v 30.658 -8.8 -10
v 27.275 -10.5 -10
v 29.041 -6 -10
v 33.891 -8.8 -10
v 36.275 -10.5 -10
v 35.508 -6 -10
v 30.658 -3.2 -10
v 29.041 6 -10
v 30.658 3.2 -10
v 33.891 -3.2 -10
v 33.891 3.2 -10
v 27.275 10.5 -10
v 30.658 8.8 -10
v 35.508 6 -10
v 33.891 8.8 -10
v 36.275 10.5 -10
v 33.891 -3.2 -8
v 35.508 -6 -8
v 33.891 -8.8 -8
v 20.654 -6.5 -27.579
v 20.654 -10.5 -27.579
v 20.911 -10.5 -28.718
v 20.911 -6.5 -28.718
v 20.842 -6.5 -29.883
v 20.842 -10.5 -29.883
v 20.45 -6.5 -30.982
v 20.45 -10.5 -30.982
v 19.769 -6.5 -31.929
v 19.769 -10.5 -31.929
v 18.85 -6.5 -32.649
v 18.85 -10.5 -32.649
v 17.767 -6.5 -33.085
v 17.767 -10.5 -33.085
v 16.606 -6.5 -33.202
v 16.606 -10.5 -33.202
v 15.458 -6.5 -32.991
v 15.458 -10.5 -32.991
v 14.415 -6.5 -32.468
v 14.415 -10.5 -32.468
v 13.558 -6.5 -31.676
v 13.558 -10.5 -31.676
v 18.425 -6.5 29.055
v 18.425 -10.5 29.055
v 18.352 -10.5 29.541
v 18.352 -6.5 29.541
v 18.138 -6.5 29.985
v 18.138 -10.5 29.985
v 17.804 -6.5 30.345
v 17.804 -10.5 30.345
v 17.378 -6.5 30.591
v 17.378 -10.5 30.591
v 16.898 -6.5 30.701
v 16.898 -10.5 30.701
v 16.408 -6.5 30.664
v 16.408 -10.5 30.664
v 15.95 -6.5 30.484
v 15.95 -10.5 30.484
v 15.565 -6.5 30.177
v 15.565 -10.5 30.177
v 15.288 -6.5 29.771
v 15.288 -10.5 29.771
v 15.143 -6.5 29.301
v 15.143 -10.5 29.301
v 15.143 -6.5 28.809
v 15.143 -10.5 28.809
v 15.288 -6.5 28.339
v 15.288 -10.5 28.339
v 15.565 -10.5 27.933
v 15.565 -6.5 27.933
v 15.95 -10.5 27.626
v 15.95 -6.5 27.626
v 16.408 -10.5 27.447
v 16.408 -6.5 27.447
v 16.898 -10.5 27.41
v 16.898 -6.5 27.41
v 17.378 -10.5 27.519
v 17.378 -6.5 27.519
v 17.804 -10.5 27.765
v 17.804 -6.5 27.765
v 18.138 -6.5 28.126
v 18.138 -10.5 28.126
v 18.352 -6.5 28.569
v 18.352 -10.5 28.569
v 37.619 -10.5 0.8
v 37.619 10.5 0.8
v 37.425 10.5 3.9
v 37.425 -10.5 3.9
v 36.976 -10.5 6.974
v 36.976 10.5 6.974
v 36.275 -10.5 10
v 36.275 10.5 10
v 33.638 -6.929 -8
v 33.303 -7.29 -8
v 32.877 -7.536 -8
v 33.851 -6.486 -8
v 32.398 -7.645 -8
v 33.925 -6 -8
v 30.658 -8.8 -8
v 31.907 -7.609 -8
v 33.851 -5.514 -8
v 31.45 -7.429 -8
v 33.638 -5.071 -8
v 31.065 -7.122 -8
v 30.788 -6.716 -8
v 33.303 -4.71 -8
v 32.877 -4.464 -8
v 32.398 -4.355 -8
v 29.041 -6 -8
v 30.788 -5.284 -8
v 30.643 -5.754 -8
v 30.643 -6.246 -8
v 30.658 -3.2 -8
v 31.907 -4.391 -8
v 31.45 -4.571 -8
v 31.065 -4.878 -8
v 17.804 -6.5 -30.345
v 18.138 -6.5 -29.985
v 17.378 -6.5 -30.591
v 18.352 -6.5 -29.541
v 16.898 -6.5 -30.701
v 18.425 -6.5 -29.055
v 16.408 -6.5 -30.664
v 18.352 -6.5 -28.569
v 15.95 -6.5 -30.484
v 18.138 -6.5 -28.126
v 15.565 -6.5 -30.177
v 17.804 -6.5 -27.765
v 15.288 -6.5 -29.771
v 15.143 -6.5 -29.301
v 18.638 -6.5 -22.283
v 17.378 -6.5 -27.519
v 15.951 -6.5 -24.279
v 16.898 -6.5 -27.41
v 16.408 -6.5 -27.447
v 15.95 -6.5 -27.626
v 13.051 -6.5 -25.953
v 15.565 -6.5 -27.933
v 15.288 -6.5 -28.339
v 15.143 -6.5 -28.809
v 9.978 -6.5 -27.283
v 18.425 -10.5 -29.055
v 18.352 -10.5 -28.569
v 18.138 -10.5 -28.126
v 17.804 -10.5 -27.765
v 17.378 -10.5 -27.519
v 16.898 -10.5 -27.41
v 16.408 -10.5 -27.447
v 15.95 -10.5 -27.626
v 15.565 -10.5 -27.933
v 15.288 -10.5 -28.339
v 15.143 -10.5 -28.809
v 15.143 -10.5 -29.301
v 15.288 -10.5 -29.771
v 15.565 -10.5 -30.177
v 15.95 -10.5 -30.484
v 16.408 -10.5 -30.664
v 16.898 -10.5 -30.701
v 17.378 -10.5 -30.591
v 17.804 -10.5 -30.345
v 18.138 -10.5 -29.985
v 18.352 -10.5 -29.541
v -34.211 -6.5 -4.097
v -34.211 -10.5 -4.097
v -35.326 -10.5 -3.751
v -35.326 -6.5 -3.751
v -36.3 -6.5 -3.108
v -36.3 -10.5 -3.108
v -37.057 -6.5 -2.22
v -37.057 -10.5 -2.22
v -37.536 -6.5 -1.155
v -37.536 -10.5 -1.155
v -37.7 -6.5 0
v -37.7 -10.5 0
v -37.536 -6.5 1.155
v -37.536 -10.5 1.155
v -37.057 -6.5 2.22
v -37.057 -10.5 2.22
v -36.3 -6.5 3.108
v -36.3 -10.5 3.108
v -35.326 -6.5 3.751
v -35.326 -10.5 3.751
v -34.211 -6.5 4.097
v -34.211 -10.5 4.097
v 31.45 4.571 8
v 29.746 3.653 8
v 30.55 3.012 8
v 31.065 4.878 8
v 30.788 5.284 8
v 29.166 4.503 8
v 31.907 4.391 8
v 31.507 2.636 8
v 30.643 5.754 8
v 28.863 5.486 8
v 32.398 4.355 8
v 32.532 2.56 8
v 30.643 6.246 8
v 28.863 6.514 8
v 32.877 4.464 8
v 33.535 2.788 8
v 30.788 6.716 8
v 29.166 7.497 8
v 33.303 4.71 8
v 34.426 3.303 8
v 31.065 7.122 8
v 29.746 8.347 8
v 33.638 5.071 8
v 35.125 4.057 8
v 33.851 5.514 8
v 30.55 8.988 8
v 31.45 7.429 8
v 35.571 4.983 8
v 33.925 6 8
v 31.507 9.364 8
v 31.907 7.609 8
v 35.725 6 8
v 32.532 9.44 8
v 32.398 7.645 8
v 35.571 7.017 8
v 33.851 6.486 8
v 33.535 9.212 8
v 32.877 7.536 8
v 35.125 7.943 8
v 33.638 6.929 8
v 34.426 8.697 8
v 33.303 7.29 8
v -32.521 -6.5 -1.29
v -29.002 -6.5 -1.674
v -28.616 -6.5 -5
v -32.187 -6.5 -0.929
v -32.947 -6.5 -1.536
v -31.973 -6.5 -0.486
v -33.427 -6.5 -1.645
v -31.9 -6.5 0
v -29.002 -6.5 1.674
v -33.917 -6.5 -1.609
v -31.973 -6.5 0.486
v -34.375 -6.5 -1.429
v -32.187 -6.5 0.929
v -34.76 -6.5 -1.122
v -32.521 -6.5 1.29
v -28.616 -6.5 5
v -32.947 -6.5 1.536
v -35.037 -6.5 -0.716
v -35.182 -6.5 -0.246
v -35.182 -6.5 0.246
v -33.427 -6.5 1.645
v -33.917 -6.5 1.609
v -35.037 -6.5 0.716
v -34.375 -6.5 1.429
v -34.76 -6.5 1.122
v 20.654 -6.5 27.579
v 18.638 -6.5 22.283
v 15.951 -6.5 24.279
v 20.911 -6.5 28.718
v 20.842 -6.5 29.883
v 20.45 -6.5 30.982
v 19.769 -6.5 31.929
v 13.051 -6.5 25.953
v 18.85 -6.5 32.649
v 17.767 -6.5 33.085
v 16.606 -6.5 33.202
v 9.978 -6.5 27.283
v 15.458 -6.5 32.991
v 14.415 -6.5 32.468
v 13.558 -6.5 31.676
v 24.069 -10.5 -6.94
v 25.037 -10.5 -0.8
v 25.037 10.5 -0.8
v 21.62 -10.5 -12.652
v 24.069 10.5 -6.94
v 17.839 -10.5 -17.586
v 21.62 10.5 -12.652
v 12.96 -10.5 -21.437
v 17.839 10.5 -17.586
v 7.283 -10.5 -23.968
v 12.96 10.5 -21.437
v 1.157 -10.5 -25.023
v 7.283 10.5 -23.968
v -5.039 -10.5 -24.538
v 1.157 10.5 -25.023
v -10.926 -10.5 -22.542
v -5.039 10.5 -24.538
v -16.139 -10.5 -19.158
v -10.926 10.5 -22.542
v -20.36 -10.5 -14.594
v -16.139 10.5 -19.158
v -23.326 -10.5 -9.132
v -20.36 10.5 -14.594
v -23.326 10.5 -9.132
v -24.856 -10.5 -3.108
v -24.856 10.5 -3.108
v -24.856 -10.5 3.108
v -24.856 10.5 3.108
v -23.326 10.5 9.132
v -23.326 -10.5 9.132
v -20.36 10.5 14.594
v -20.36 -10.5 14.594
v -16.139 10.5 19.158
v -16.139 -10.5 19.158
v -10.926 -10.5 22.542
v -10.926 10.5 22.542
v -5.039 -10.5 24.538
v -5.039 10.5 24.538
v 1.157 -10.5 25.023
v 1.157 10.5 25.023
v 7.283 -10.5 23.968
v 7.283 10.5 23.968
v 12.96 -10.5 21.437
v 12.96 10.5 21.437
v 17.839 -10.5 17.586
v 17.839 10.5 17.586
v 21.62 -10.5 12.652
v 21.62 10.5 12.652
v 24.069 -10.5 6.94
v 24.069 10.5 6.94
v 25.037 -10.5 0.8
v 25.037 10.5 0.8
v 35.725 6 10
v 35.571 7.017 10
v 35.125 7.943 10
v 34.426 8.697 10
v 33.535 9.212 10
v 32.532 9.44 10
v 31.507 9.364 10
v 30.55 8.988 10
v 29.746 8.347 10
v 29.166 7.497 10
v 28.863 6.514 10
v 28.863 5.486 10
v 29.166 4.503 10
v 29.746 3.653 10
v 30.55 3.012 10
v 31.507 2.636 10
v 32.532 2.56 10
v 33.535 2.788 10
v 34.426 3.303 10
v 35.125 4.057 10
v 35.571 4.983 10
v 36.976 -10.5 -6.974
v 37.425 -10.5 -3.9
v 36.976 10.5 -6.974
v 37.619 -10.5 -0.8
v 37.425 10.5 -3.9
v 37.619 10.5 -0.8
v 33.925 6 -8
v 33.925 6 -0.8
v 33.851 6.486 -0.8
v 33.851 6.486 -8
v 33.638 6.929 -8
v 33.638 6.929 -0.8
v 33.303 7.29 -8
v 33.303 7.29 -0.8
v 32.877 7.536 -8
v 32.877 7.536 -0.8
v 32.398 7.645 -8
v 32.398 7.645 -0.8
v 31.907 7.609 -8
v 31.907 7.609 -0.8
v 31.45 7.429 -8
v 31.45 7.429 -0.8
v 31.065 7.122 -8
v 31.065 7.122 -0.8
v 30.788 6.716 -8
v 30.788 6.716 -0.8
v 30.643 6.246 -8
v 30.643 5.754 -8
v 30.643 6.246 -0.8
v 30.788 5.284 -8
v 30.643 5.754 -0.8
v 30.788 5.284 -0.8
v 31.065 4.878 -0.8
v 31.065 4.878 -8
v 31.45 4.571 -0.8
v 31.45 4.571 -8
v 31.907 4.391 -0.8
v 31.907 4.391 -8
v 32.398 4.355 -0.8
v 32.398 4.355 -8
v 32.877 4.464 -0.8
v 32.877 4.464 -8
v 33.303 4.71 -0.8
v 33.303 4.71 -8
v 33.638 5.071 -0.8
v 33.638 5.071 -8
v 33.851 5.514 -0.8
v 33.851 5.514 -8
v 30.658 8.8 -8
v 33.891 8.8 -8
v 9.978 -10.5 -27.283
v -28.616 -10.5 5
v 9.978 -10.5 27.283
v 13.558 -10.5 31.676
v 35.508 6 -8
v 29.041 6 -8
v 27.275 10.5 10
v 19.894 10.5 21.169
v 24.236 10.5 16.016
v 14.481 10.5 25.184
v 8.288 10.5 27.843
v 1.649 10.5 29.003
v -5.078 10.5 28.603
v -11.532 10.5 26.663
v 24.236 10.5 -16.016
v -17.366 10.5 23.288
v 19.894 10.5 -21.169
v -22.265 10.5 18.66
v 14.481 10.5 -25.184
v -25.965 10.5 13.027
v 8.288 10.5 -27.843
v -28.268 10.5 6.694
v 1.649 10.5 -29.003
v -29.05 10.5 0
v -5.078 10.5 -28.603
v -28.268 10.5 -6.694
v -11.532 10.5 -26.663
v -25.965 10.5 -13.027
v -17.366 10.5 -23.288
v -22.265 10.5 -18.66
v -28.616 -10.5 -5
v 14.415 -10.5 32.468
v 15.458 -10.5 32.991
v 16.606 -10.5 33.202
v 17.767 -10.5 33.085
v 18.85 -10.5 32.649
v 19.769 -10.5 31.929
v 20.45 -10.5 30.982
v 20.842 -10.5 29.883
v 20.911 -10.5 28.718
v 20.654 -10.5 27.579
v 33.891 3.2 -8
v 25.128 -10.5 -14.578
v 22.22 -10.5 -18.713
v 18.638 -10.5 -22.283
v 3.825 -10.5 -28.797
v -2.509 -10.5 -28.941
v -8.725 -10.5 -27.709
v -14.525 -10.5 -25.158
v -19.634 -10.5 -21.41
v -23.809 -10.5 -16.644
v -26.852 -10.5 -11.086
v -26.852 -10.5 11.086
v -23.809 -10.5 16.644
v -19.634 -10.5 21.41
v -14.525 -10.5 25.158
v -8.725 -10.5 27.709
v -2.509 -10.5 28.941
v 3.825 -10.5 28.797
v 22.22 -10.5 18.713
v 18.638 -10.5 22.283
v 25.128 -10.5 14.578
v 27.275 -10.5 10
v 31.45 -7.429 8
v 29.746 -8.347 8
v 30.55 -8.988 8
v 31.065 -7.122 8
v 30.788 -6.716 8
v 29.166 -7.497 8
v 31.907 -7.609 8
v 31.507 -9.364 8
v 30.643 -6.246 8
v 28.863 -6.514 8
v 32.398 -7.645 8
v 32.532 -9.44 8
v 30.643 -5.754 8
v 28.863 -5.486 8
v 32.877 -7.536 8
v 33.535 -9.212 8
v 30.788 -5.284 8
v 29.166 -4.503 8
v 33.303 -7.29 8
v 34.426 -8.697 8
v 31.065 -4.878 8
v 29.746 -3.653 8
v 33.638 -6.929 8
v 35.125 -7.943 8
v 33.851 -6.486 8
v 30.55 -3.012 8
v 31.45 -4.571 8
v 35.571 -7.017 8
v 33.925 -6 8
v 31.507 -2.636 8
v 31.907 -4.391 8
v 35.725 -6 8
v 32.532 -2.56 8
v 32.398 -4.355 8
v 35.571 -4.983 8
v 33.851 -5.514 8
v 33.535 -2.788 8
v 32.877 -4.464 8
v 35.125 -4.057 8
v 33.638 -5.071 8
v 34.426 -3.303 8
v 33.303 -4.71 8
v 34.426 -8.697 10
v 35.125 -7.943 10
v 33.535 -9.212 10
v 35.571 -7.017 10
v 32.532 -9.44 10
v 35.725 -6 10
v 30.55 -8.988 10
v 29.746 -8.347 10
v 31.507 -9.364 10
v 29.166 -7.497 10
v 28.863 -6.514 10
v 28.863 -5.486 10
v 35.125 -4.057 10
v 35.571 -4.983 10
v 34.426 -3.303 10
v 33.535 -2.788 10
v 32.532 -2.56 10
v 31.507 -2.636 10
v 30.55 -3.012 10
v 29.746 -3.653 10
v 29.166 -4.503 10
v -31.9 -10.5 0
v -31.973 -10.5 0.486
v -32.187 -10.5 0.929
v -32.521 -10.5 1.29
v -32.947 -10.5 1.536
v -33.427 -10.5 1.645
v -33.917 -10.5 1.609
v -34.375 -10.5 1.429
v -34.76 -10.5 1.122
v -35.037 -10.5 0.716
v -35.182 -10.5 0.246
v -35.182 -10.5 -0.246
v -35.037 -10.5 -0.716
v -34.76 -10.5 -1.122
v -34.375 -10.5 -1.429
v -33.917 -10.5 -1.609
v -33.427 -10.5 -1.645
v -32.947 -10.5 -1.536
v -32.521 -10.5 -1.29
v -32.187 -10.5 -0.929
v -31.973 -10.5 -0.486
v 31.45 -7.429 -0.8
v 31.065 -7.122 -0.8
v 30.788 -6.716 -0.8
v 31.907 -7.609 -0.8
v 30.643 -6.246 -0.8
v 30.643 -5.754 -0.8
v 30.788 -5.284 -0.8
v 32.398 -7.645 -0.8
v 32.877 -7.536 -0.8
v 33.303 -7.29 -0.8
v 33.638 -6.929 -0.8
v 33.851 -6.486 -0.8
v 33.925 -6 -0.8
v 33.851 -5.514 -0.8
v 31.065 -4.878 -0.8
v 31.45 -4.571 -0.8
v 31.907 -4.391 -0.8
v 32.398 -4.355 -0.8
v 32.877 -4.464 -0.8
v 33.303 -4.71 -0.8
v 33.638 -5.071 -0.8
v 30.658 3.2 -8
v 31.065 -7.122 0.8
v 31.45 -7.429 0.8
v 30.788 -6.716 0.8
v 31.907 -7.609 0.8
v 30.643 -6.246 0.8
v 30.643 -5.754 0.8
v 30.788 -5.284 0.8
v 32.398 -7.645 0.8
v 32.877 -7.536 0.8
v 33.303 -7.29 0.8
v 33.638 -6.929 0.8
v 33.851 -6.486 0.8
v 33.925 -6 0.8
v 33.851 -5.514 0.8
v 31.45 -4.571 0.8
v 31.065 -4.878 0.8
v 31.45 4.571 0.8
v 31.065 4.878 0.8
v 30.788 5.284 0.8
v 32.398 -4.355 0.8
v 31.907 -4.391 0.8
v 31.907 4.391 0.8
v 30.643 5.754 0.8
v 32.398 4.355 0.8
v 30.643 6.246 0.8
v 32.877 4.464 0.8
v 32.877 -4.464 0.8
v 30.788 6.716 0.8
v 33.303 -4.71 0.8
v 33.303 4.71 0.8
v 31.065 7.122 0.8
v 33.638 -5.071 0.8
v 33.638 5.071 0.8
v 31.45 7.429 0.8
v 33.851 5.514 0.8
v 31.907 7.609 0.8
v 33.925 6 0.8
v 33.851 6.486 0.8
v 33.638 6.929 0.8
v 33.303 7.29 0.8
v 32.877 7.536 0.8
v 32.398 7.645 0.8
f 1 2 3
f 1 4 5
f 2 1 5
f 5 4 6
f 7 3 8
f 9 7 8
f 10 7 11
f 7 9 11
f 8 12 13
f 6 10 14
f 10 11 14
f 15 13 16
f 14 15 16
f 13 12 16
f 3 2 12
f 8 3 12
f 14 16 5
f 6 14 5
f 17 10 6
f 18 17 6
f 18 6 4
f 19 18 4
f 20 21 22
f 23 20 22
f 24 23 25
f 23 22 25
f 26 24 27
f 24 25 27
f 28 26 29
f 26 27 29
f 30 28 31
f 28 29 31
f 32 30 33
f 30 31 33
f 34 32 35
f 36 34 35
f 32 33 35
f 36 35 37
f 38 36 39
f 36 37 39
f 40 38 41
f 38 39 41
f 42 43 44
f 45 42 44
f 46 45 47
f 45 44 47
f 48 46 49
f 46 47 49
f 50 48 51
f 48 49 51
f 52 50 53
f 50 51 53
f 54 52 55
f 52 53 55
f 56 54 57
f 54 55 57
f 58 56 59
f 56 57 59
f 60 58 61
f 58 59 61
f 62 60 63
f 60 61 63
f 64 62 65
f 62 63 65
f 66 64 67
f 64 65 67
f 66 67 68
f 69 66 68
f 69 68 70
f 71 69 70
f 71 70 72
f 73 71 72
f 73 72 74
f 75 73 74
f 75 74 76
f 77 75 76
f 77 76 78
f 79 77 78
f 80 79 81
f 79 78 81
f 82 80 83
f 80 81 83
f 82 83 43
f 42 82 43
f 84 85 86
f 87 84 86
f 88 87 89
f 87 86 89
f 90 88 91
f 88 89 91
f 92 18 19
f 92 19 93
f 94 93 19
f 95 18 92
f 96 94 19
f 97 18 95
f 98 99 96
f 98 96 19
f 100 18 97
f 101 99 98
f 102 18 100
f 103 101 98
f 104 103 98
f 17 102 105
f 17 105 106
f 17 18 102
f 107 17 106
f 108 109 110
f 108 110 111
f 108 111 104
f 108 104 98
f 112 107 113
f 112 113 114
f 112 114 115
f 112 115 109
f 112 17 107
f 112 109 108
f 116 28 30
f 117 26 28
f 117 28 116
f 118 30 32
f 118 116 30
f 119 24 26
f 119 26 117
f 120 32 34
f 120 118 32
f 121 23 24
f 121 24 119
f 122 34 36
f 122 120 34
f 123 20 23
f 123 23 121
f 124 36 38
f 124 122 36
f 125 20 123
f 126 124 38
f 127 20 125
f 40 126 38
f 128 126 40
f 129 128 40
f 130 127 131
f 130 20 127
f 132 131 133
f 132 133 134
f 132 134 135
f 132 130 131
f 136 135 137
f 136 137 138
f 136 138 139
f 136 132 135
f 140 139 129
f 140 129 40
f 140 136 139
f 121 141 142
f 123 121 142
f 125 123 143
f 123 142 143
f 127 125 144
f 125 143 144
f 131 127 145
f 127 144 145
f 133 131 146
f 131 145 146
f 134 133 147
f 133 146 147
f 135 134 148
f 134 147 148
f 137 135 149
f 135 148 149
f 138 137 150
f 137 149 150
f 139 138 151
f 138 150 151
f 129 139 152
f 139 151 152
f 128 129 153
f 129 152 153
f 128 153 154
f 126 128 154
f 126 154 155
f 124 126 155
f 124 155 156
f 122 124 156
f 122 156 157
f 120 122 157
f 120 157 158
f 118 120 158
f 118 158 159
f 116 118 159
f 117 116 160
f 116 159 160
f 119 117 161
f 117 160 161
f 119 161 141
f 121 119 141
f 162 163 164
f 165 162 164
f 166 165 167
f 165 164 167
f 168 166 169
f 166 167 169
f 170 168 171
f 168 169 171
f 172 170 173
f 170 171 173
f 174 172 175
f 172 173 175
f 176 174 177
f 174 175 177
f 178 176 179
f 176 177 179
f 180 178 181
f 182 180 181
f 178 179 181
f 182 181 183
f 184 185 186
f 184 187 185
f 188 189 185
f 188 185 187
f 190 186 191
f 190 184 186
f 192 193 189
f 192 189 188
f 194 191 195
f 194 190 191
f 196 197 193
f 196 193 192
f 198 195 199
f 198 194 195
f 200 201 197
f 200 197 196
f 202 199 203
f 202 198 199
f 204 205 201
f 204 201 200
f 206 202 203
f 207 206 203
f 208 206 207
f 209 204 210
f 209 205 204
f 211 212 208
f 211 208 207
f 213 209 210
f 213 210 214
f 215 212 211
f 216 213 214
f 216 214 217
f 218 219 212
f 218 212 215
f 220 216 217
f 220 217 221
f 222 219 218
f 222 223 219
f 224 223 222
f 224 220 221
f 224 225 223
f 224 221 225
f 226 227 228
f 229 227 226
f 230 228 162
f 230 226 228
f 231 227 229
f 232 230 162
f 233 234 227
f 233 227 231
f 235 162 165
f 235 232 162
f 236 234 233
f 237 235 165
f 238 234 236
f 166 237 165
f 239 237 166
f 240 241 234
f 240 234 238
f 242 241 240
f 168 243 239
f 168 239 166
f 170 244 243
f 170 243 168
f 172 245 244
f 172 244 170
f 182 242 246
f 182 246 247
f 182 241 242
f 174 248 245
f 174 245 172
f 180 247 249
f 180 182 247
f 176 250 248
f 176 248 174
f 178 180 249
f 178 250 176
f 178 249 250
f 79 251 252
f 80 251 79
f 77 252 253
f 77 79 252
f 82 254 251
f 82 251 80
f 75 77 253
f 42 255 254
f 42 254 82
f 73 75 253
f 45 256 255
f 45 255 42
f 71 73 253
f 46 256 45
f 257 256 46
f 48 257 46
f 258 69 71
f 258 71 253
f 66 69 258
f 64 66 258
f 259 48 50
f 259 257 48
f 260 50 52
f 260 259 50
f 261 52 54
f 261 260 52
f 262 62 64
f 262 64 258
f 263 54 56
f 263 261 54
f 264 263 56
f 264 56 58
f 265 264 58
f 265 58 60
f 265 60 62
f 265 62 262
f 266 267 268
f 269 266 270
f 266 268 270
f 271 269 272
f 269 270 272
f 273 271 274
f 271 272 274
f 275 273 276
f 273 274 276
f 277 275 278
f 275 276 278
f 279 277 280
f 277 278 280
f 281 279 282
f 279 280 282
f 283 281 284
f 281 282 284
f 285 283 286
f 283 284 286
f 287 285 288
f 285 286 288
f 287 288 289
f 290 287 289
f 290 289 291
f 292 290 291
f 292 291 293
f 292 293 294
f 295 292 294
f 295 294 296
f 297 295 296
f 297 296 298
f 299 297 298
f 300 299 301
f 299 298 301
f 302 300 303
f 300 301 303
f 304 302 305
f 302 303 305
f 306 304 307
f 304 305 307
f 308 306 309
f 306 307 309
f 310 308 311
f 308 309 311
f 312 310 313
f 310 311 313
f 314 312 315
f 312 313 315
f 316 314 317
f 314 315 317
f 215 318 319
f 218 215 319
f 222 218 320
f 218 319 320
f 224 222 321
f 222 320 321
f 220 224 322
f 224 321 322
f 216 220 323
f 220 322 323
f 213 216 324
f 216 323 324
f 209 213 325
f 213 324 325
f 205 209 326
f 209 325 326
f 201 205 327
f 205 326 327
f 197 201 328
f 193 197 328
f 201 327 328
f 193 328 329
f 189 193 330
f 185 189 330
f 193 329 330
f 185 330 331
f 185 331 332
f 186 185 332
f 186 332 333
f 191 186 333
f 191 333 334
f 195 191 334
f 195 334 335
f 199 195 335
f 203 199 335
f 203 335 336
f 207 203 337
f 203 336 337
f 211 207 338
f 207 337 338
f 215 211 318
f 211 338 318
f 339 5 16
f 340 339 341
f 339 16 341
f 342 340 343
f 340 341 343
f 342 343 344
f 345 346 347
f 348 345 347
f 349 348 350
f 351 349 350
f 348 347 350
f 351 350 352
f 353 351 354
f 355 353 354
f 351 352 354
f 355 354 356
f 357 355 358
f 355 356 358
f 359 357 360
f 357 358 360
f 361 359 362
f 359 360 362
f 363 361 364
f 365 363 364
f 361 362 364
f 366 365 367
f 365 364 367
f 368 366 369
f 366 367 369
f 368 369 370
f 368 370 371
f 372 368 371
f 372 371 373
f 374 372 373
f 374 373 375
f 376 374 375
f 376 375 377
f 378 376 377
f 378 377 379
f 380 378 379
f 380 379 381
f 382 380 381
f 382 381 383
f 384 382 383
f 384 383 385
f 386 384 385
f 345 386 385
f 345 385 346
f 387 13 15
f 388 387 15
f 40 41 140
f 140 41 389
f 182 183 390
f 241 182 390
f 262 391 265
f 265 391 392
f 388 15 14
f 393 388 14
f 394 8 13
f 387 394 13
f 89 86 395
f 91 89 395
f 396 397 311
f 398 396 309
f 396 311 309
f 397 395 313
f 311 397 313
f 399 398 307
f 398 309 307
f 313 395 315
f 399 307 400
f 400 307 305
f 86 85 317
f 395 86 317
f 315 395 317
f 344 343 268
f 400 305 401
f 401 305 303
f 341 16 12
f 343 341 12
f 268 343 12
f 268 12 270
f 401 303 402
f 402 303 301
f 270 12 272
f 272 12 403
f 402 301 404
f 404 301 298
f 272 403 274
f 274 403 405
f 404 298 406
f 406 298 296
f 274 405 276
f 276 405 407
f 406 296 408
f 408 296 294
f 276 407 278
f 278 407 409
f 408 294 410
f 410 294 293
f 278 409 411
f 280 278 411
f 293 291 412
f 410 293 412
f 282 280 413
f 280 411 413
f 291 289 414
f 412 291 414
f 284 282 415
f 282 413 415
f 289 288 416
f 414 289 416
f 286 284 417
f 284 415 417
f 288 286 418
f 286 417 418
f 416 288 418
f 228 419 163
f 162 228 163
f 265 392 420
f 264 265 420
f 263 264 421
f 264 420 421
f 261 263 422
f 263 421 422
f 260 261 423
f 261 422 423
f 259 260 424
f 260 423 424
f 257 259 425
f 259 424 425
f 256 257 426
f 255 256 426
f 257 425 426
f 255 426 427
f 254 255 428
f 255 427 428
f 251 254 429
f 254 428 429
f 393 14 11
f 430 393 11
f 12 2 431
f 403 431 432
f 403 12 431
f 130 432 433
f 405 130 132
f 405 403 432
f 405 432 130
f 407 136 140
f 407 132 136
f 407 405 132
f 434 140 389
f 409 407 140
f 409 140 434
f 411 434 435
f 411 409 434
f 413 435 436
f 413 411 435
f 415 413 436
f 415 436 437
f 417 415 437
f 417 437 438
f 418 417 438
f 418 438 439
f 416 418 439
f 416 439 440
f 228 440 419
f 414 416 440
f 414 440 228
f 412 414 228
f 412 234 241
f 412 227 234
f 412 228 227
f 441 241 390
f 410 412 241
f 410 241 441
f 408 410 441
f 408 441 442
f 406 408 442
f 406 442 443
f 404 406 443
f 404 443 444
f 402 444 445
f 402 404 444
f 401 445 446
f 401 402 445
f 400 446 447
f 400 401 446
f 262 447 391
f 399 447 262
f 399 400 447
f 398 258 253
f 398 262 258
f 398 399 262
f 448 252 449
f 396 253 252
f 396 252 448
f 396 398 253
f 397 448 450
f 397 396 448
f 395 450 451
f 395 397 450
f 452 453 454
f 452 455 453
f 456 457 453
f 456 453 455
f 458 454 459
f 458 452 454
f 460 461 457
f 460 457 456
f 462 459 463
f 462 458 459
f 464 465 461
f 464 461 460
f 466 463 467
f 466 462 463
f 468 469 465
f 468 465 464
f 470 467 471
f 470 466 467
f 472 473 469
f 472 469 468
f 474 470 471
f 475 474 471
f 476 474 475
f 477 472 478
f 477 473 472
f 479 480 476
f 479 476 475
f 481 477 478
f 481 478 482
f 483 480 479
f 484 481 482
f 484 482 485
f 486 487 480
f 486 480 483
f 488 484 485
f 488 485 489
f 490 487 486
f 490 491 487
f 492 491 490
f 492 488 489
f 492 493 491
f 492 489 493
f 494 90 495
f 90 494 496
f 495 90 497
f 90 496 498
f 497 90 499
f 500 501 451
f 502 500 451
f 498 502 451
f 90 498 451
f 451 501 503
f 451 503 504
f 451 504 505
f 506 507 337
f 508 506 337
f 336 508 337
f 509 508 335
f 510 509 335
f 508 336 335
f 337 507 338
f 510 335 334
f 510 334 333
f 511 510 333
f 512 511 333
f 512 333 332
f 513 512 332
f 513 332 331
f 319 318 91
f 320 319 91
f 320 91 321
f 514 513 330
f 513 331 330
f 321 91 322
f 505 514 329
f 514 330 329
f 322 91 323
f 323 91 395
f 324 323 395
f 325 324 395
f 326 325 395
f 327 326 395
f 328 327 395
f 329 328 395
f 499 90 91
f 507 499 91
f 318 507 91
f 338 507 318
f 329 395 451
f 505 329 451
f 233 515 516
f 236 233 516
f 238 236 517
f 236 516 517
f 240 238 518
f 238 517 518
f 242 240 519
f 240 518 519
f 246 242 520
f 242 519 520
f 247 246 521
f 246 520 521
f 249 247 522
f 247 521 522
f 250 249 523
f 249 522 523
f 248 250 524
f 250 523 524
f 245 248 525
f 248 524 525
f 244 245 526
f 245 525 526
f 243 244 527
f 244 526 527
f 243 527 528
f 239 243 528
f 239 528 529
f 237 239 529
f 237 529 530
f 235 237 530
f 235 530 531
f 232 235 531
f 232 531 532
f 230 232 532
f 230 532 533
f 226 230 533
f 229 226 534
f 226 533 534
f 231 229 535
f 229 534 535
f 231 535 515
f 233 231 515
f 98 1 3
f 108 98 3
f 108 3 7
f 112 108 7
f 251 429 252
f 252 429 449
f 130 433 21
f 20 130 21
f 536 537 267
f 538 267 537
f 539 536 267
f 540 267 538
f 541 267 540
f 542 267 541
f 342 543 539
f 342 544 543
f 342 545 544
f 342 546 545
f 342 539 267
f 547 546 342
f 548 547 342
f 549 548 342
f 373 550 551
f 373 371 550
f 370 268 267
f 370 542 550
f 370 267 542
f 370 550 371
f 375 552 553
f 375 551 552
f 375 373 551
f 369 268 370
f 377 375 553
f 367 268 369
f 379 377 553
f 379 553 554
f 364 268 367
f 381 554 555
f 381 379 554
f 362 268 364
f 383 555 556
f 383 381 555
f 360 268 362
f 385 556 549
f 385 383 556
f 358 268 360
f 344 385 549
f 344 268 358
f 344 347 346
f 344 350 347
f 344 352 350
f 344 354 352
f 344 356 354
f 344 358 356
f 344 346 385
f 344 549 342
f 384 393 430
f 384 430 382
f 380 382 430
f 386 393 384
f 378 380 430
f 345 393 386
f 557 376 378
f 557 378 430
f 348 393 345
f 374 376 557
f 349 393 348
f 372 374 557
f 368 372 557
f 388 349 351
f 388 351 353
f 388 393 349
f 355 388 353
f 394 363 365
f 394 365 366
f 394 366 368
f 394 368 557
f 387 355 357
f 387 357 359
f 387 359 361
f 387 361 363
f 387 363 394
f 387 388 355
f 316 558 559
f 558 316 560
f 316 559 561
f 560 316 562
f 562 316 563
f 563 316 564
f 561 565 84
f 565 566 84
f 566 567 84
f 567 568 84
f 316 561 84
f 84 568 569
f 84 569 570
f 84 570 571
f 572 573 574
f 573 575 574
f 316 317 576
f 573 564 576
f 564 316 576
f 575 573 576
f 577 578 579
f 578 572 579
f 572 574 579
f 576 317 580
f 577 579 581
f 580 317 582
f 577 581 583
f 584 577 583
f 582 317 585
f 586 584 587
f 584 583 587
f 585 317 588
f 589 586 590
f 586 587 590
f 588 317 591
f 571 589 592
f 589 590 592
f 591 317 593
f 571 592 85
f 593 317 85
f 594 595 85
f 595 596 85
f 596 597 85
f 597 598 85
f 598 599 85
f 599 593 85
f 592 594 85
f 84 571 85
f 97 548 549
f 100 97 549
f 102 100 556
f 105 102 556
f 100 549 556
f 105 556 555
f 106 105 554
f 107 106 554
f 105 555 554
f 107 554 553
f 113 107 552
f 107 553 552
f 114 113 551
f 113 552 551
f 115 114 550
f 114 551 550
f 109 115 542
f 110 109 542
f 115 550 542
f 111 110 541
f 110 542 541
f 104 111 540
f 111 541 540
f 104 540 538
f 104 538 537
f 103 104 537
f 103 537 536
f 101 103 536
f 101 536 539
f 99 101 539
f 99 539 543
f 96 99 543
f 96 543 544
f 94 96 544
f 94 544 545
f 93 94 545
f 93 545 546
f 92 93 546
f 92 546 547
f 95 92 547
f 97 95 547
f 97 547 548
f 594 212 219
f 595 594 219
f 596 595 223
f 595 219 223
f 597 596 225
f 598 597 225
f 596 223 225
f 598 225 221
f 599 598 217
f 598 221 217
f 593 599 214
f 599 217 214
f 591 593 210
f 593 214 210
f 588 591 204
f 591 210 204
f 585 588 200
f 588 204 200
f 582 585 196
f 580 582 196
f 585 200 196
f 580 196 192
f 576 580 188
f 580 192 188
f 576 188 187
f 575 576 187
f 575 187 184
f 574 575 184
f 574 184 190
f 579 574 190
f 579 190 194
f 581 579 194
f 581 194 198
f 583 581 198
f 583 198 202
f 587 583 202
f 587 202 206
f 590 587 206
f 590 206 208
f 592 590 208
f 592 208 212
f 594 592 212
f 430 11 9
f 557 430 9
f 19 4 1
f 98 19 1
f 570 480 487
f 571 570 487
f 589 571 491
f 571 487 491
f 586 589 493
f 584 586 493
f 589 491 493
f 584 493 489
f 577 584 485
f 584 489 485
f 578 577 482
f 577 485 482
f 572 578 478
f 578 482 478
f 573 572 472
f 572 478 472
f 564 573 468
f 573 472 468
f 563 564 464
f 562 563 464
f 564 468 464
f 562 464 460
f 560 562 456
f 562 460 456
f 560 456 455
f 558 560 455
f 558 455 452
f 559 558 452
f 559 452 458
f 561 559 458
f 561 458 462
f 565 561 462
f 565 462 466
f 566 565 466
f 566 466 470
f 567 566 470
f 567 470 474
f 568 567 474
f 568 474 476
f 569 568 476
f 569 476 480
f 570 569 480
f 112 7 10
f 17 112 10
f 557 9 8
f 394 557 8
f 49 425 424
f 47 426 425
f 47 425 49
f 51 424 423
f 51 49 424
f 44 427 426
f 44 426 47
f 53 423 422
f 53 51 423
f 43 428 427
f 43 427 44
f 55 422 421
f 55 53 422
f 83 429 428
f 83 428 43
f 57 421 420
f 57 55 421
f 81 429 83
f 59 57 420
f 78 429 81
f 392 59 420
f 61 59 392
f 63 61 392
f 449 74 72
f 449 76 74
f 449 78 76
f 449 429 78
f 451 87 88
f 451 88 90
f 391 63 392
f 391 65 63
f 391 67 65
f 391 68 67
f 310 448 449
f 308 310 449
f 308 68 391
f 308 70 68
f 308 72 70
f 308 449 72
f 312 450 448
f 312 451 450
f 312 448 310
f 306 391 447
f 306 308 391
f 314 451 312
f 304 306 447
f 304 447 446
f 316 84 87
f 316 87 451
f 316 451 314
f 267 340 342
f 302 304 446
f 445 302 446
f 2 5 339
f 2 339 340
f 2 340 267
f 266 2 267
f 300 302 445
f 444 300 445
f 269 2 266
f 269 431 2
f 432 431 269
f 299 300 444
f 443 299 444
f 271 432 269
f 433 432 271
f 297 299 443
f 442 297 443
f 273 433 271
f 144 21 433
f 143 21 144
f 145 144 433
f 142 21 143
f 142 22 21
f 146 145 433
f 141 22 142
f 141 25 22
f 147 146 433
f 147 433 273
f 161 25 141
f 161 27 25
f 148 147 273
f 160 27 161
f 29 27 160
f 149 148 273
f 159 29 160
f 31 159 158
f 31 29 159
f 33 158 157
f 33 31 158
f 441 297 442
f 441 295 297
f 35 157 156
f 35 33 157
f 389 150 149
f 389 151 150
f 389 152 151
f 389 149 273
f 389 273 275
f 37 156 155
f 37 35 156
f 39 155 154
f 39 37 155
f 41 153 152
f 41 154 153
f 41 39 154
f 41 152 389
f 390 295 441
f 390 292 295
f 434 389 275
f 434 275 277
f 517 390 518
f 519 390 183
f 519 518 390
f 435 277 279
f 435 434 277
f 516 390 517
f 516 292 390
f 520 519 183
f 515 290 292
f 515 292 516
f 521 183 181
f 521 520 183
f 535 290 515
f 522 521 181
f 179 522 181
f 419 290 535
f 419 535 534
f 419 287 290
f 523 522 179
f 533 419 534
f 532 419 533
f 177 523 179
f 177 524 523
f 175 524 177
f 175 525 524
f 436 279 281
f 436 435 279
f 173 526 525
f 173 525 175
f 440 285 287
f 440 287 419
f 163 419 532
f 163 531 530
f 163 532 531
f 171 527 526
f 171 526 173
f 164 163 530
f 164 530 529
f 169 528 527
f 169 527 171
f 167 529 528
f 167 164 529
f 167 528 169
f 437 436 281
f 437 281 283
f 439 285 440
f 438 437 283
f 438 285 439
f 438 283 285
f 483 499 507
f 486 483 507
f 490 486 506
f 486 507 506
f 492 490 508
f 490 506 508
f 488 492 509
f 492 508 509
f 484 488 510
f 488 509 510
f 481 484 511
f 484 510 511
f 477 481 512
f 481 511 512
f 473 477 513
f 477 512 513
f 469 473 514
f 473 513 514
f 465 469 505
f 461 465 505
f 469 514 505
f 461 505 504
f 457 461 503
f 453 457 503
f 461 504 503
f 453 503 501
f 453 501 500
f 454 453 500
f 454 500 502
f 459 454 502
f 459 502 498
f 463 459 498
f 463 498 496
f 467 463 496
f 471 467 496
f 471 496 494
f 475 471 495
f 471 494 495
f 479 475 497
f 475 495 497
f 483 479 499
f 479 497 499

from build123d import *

# Parameters (mm, degrees)
SKETCH_1_W               = 4
SKETCH_1_H               = 21
EXTRUDE_2_DEPTH          = 21
SKETCH_2_W               = 12.68061601
SKETCH_2_H               = 1.6
CUT_EXTRUDE_1_DEPTH      = 1
CUT_EXTRUDE_1_DEPTH_BACK = 22
SKETCH_4_R               = 1.65
CUT_EXTRUDE_2_DEPTH      = 40.05
CUT_EXTRUDE_3_DEPTH      = 2
SKETCH_6_R               = 3.45
SKETCH_6_R_2             = 1.65
CUT_EXTRUDE_4_DEPTH      = 2
SKETCH_7_R               = 1.65
EXTRUDE_3_DEPTH          = 4


with BuildPart() as part:
    # 草图1 → 旋转1 (revolve)
    with BuildSketch(Plane.XY):
        with Locations((27.05, 0)):
            Rectangle(SKETCH_1_W, SKETCH_1_H)
    revolve(axis=Axis((0, 0, 0), (0, 1, 0)))

    # 草图3 → 凸台-拉伸2 (add, through all)
    with BuildSketch(Plane(origin=(0, 10.5, 0), x_dir=(1, 0, 0), z_dir=(0, 1, 0))):
        with BuildLine():
            Line((27.274576074, 10), (36.274576074, 10))
            ThreePointArc((36.274576074, 10), (37.627714112, 0), (36.274576074, -10))
            Line((36.274576074, -10), (27.274576074, -10))
            Line((27.274576074, -10), (27.274576074, 10))
        make_face()
    extrude(amount=-EXTRUDE_2_DEPTH)

    # 草图2 → 切除-拉伸1 (cut, two sides)
    with BuildSketch(Plane(origin=(0, 10.5, 0), x_dir=(1, 0, 0), z_dir=(0, 1, 0))) as cut_extrude_1_sk:
        with Locations((31.287406107, 0)):
            Rectangle(SKETCH_2_W, SKETCH_2_H)
    extrude(amount=CUT_EXTRUDE_1_DEPTH, mode=Mode.SUBTRACT)
    extrude(cut_extrude_1_sk.sketch, amount=-CUT_EXTRUDE_1_DEPTH_BACK, mode=Mode.SUBTRACT)

    # 草图4 → 切除-拉伸2 (cut, through all)
    with BuildSketch(Plane.XY.offset(10)):
        with Locations((32.274576074, 6)):
            Circle(SKETCH_4_R)
        with Locations((32.274576074, -6)):
            Circle(SKETCH_4_R)
    extrude(amount=-CUT_EXTRUDE_2_DEPTH, mode=Mode.SUBTRACT)

    # 草图5 → 切除-拉伸3 (cut)
    with BuildSketch(Plane(origin=(0, 0, -10), x_dir=(-1, 0, 0), z_dir=(0, 0, -1))):
        Polygon((-30.65799532, 8.8), (-33.891156827, 8.8), (-35.507737581, 6), (-33.891156827, 3.2), (-30.65799532, 3.2), (-29.041414566, 6), align=None)
        Polygon((-30.65799532, -3.2), (-33.891156827, -3.2), (-35.507737581, -6), (-33.891156827, -8.8), (-30.65799532, -8.8), (-29.041414566, -6), align=None)
    extrude(amount=-CUT_EXTRUDE_3_DEPTH, mode=Mode.SUBTRACT)

    # 草图6 → 切除-拉伸4 (cut)
    with BuildSketch(Plane.XY.offset(10)):
        with Locations((32.274576074, -6)):
            Circle(SKETCH_6_R)
        with Locations((32.274576074, -6)):
            Circle(SKETCH_6_R_2, mode=Mode.SUBTRACT)
        with Locations((32.274576074, 6)):
            Circle(SKETCH_6_R)
        with Locations((32.274576074, 6)):
            Circle(SKETCH_6_R_2, mode=Mode.SUBTRACT)
    extrude(amount=-CUT_EXTRUDE_4_DEPTH, mode=Mode.SUBTRACT)

    # 草图7 → 凸台-拉伸3 (add)
    with BuildSketch(Plane.XZ.offset(10.5)):
        with BuildLine():
            Line((-34.211268637, 4.096977397), (-28.616472529, 5))
            ThreePointArc((-28.616472529, 5), (-29.05, 0), (-28.616472529, -5))
            Line((-28.616472529, -5), (-34.211268637, -4.096977397))
            ThreePointArc((-34.211268637, -4.096977397), (-37.7, 0), (-34.211268637, 4.096977397))
        make_face()
        with Locations((-33.55, 0)):
            Circle(SKETCH_7_R, mode=Mode.SUBTRACT)
        with BuildLine():
            Line((20.653720823, 27.579339037), (18.638363283, 22.282592177))
            ThreePointArc((18.638363283, 22.282592177), (14.525, 25.15803798), (9.978109246, 27.282592177))
            Line((9.978109246, 27.282592177), (13.557547814, 31.676316433))
            ThreePointArc((13.557547814, 31.676316433), (18.85, 32.649157723), (20.653720823, 27.579339037))
        make_face()
        with Locations((16.775, 29.055152297)):
            Circle(SKETCH_7_R, mode=Mode.SUBTRACT)
        with BuildLine():
            Line((13.557547814, -31.676316433), (9.978109246, -27.282592177))
            ThreePointArc((9.978109246, -27.282592177), (14.525, -25.15803798), (18.638363283, -22.282592177))
            Line((18.638363283, -22.282592177), (20.653720823, -27.579339037))
            ThreePointArc((20.653720823, -27.579339037), (18.85, -32.649157723), (13.557547814, -31.676316433))
        make_face()
        with Locations((16.775, -29.055152297)):
            Circle(SKETCH_7_R, mode=Mode.SUBTRACT)
    extrude(amount=-EXTRUDE_3_DEPTH)


solid = part.part
